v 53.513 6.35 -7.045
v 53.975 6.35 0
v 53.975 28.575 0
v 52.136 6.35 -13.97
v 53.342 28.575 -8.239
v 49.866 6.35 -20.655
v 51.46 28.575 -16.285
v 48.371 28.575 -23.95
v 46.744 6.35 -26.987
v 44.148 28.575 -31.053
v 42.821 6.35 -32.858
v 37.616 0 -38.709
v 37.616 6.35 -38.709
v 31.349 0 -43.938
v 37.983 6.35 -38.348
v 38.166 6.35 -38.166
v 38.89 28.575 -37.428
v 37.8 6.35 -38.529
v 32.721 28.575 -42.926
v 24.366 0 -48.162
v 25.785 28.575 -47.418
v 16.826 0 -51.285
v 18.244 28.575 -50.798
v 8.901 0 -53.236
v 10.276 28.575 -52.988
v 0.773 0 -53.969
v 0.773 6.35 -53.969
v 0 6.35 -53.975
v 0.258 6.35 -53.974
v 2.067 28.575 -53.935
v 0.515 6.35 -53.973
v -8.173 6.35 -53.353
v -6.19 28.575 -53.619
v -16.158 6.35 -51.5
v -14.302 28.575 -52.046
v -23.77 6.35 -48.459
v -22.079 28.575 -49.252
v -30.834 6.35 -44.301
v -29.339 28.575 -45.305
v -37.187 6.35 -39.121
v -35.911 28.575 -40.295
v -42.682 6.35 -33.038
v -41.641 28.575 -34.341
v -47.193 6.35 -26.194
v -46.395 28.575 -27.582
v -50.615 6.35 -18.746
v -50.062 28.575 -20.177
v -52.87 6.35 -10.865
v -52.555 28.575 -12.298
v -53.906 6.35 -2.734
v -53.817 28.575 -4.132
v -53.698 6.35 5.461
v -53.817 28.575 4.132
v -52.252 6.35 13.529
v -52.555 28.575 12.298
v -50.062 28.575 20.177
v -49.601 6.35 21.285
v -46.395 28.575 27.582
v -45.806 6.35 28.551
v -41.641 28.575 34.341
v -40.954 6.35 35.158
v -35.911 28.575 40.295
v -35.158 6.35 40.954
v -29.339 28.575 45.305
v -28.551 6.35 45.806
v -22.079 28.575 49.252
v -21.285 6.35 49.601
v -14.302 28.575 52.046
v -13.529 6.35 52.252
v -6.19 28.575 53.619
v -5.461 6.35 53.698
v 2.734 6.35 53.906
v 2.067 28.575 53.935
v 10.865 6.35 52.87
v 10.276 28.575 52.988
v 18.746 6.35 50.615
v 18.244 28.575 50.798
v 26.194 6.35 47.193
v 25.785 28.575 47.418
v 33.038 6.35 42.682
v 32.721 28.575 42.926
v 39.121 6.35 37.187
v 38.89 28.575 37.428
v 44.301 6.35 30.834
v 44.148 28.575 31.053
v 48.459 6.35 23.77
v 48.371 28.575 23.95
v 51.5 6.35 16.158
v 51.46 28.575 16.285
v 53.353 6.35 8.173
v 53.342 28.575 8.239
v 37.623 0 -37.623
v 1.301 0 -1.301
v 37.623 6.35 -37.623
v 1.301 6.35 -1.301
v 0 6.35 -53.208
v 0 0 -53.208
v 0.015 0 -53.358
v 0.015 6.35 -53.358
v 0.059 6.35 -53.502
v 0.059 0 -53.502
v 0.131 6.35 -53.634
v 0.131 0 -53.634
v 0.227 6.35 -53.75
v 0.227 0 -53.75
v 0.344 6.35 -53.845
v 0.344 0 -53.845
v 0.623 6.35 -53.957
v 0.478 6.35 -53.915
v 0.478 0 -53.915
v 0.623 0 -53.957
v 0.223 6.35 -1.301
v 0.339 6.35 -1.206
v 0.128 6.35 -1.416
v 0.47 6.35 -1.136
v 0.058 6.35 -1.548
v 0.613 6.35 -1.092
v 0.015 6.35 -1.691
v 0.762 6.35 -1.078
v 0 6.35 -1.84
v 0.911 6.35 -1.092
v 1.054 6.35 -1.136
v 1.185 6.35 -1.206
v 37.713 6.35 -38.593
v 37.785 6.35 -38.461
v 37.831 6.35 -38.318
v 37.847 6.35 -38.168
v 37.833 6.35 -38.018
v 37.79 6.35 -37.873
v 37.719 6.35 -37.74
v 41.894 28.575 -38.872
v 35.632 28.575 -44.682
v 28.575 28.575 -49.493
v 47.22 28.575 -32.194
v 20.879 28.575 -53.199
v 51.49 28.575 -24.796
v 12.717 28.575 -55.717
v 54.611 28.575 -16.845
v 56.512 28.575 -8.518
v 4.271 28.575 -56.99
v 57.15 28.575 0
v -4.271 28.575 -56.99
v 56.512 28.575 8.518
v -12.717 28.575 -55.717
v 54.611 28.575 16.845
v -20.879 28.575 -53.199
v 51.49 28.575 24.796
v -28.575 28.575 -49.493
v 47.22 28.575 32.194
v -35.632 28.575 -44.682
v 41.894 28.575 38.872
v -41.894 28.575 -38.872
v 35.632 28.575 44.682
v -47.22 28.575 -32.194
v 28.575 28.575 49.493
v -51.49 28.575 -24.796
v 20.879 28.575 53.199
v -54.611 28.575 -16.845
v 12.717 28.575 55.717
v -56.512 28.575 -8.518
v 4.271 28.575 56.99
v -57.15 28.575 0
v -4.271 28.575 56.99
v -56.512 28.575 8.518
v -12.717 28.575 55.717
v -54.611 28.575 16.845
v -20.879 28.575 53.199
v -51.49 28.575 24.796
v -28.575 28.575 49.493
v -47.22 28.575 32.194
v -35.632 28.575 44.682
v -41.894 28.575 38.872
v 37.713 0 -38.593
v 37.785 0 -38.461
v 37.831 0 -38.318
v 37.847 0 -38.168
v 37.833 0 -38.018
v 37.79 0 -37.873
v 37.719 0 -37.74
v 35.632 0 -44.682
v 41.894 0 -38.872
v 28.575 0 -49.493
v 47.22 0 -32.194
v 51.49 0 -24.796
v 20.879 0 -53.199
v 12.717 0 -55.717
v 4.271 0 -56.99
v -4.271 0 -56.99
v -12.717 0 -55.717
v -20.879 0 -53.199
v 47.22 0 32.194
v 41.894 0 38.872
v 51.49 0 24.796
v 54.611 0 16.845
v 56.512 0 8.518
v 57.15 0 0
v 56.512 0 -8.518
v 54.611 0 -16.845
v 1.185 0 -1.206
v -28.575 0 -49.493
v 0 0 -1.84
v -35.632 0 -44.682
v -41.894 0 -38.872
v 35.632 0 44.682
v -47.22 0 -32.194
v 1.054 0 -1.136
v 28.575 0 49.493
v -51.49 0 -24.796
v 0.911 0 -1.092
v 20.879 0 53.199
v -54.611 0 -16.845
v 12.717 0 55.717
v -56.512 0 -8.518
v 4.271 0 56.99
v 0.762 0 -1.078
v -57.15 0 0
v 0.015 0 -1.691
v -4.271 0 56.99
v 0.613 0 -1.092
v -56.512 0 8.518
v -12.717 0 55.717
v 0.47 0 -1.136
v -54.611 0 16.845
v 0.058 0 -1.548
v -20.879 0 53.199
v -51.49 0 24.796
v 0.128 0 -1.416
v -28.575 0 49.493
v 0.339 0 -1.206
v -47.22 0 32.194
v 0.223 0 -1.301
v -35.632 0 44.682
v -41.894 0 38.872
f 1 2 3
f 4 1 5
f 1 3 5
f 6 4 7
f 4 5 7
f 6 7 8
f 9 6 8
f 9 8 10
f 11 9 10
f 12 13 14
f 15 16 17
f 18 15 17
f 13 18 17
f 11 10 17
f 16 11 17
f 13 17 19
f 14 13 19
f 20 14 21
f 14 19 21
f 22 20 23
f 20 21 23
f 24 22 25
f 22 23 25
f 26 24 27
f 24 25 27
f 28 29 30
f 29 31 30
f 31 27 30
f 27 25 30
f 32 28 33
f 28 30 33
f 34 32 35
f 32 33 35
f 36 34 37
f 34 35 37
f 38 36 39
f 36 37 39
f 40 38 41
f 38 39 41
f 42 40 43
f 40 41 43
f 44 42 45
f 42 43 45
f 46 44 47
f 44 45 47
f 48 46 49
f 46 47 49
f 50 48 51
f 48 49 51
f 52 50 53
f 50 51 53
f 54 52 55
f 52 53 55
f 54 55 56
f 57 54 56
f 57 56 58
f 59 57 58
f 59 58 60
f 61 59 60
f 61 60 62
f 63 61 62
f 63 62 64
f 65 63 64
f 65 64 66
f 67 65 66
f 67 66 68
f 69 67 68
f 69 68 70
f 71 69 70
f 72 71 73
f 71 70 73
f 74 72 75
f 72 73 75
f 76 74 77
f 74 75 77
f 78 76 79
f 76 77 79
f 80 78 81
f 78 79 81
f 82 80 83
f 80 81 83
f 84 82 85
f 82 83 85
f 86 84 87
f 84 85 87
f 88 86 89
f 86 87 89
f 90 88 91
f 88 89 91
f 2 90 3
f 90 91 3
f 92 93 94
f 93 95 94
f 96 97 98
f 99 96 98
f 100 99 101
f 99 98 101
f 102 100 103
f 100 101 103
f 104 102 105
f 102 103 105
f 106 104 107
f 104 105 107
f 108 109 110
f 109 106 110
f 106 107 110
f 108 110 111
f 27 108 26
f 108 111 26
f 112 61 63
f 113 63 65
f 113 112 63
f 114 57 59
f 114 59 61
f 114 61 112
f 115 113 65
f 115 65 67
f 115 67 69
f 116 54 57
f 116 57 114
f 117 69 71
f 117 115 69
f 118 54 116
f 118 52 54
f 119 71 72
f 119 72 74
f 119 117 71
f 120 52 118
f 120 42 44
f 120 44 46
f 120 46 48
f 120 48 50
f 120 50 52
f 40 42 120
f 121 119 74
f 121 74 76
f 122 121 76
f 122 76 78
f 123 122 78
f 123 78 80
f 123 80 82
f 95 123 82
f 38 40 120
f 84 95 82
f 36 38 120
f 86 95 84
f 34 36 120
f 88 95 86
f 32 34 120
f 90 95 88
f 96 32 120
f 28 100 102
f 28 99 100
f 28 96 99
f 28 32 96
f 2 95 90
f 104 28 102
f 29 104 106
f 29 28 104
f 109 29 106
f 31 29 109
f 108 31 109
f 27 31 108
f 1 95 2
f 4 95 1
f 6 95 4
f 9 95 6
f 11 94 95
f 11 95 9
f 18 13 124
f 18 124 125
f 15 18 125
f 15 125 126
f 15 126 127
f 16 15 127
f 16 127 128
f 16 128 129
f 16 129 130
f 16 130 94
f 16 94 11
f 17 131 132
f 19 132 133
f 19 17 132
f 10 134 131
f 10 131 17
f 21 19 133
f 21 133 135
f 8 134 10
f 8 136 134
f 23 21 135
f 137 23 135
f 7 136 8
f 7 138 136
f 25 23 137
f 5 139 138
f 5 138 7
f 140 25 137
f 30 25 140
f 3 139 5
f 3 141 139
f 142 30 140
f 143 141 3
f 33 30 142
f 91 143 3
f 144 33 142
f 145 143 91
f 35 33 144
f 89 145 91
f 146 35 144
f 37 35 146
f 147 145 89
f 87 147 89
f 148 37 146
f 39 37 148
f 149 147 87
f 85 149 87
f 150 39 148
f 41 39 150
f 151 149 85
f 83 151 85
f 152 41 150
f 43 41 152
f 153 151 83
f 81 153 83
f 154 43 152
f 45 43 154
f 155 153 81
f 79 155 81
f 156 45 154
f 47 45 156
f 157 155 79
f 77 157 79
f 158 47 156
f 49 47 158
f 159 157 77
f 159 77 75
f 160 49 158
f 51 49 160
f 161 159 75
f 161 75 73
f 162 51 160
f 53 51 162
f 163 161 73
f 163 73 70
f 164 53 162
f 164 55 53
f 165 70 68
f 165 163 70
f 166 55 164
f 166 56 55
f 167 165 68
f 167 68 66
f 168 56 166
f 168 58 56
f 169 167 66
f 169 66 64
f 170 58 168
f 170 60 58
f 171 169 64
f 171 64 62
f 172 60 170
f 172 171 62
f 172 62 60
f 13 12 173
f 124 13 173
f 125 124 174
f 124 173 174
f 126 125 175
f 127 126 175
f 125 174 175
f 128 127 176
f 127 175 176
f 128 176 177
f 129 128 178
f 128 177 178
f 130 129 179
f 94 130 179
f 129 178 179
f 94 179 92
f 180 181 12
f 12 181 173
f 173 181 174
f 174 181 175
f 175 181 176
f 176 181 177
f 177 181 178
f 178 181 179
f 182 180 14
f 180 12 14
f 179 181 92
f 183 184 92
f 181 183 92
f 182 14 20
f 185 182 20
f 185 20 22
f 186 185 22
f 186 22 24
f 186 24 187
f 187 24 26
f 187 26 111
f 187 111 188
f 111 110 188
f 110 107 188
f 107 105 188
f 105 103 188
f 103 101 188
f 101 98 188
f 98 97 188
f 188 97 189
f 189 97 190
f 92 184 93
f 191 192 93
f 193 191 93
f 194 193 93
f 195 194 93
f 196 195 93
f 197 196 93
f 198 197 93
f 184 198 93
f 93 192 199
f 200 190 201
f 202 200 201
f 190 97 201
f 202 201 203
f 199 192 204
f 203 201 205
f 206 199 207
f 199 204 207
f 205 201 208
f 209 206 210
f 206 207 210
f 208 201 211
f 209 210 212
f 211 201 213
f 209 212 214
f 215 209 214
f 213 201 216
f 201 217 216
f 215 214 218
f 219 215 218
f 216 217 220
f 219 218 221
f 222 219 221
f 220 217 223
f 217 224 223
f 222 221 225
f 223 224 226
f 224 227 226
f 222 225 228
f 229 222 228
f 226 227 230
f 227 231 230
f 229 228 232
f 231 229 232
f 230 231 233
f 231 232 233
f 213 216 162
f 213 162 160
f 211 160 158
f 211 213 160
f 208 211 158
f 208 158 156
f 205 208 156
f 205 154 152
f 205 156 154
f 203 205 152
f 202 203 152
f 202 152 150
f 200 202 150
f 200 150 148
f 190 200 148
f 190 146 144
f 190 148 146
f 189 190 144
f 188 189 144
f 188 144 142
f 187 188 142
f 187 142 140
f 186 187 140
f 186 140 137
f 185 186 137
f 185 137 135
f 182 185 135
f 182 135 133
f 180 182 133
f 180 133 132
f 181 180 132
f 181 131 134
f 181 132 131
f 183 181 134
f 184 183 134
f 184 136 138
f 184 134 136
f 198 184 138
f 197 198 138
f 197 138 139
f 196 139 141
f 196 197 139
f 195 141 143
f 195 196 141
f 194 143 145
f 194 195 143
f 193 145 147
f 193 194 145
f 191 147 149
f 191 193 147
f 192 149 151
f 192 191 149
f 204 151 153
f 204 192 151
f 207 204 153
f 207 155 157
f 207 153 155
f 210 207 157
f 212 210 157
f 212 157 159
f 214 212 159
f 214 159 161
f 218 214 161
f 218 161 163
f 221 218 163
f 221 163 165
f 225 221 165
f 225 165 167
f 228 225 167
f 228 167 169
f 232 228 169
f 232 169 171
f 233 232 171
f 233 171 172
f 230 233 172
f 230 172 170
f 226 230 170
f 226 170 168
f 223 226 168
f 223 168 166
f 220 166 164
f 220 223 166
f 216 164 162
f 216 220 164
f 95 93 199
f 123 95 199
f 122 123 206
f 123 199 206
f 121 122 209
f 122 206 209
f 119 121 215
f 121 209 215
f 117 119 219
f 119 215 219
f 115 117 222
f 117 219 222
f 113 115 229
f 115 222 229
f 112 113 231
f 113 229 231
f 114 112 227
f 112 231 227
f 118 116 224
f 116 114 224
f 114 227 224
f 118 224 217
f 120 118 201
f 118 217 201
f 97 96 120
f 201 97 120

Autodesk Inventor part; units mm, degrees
ref_plane "YZ Plane" through (0, 0, 0) normal (1, 0, 0) x (0, 1, 0)
ref_plane "XZ Plane" through (0, 0, 0) normal (0, 1, 0) x (-1, 0, 0)
ref_plane "XY Plane" through (0, 0, 0) normal (0, 0, 1) x (1, 0, 0)
sketch "Sketch1" plane through (0, 0, 0) normal (0, 1, 0) x (-1, 0, 0)
  circle A0 centre (0, 0) radius 57.15
  circle A1 centre (0, 0) radius 53.975
  dimension "d0" = 114.3
  dimension "d1" = 107.95
extrude "Extrusion1" add sketch "Sketch1" along normal blind 28.575 contours A0 | A1
sketch "Sketch2" plane through (0, 28.575, 0) normal (0, 1, 0) x (1, 0, 0)
  circle A0 centre (0, 0) radius 53.975
  dimension "d4" = 107.95
extrude "Extrusion2" cut sketch "Sketch2" against normal blind 22.225
sketch "Sketch3" plane through (0, 6.35, 0) normal (0, 1, 0) x (1, 0, 0)
  circle A0 centre (0, 0) radius 53.975 projected
  line L0 (0, 53.975) -> (0, 0)
  line L1 (0, 0) -> (53.975, 0)
  line L2 (0, 0) -> (40.4112, 40.4112)
  line L3 (0, 0) -> (57.15, 0) construction
  point P0 (38.1661, 38.1661)
  dimension "d7" = 57.15
  dimension "d8" = 45
extrude "Extrusion3" cut sketch "Sketch3" against normal blind 22.225 contours A0 L2 L0
fillet "Fillet1" radius 0.762 3 edges at (0, 3.175, 0) (0, 3.175, -53.975) (38.1661, 3.175, -38.1661)
properties part number "FeedWheelShell"
